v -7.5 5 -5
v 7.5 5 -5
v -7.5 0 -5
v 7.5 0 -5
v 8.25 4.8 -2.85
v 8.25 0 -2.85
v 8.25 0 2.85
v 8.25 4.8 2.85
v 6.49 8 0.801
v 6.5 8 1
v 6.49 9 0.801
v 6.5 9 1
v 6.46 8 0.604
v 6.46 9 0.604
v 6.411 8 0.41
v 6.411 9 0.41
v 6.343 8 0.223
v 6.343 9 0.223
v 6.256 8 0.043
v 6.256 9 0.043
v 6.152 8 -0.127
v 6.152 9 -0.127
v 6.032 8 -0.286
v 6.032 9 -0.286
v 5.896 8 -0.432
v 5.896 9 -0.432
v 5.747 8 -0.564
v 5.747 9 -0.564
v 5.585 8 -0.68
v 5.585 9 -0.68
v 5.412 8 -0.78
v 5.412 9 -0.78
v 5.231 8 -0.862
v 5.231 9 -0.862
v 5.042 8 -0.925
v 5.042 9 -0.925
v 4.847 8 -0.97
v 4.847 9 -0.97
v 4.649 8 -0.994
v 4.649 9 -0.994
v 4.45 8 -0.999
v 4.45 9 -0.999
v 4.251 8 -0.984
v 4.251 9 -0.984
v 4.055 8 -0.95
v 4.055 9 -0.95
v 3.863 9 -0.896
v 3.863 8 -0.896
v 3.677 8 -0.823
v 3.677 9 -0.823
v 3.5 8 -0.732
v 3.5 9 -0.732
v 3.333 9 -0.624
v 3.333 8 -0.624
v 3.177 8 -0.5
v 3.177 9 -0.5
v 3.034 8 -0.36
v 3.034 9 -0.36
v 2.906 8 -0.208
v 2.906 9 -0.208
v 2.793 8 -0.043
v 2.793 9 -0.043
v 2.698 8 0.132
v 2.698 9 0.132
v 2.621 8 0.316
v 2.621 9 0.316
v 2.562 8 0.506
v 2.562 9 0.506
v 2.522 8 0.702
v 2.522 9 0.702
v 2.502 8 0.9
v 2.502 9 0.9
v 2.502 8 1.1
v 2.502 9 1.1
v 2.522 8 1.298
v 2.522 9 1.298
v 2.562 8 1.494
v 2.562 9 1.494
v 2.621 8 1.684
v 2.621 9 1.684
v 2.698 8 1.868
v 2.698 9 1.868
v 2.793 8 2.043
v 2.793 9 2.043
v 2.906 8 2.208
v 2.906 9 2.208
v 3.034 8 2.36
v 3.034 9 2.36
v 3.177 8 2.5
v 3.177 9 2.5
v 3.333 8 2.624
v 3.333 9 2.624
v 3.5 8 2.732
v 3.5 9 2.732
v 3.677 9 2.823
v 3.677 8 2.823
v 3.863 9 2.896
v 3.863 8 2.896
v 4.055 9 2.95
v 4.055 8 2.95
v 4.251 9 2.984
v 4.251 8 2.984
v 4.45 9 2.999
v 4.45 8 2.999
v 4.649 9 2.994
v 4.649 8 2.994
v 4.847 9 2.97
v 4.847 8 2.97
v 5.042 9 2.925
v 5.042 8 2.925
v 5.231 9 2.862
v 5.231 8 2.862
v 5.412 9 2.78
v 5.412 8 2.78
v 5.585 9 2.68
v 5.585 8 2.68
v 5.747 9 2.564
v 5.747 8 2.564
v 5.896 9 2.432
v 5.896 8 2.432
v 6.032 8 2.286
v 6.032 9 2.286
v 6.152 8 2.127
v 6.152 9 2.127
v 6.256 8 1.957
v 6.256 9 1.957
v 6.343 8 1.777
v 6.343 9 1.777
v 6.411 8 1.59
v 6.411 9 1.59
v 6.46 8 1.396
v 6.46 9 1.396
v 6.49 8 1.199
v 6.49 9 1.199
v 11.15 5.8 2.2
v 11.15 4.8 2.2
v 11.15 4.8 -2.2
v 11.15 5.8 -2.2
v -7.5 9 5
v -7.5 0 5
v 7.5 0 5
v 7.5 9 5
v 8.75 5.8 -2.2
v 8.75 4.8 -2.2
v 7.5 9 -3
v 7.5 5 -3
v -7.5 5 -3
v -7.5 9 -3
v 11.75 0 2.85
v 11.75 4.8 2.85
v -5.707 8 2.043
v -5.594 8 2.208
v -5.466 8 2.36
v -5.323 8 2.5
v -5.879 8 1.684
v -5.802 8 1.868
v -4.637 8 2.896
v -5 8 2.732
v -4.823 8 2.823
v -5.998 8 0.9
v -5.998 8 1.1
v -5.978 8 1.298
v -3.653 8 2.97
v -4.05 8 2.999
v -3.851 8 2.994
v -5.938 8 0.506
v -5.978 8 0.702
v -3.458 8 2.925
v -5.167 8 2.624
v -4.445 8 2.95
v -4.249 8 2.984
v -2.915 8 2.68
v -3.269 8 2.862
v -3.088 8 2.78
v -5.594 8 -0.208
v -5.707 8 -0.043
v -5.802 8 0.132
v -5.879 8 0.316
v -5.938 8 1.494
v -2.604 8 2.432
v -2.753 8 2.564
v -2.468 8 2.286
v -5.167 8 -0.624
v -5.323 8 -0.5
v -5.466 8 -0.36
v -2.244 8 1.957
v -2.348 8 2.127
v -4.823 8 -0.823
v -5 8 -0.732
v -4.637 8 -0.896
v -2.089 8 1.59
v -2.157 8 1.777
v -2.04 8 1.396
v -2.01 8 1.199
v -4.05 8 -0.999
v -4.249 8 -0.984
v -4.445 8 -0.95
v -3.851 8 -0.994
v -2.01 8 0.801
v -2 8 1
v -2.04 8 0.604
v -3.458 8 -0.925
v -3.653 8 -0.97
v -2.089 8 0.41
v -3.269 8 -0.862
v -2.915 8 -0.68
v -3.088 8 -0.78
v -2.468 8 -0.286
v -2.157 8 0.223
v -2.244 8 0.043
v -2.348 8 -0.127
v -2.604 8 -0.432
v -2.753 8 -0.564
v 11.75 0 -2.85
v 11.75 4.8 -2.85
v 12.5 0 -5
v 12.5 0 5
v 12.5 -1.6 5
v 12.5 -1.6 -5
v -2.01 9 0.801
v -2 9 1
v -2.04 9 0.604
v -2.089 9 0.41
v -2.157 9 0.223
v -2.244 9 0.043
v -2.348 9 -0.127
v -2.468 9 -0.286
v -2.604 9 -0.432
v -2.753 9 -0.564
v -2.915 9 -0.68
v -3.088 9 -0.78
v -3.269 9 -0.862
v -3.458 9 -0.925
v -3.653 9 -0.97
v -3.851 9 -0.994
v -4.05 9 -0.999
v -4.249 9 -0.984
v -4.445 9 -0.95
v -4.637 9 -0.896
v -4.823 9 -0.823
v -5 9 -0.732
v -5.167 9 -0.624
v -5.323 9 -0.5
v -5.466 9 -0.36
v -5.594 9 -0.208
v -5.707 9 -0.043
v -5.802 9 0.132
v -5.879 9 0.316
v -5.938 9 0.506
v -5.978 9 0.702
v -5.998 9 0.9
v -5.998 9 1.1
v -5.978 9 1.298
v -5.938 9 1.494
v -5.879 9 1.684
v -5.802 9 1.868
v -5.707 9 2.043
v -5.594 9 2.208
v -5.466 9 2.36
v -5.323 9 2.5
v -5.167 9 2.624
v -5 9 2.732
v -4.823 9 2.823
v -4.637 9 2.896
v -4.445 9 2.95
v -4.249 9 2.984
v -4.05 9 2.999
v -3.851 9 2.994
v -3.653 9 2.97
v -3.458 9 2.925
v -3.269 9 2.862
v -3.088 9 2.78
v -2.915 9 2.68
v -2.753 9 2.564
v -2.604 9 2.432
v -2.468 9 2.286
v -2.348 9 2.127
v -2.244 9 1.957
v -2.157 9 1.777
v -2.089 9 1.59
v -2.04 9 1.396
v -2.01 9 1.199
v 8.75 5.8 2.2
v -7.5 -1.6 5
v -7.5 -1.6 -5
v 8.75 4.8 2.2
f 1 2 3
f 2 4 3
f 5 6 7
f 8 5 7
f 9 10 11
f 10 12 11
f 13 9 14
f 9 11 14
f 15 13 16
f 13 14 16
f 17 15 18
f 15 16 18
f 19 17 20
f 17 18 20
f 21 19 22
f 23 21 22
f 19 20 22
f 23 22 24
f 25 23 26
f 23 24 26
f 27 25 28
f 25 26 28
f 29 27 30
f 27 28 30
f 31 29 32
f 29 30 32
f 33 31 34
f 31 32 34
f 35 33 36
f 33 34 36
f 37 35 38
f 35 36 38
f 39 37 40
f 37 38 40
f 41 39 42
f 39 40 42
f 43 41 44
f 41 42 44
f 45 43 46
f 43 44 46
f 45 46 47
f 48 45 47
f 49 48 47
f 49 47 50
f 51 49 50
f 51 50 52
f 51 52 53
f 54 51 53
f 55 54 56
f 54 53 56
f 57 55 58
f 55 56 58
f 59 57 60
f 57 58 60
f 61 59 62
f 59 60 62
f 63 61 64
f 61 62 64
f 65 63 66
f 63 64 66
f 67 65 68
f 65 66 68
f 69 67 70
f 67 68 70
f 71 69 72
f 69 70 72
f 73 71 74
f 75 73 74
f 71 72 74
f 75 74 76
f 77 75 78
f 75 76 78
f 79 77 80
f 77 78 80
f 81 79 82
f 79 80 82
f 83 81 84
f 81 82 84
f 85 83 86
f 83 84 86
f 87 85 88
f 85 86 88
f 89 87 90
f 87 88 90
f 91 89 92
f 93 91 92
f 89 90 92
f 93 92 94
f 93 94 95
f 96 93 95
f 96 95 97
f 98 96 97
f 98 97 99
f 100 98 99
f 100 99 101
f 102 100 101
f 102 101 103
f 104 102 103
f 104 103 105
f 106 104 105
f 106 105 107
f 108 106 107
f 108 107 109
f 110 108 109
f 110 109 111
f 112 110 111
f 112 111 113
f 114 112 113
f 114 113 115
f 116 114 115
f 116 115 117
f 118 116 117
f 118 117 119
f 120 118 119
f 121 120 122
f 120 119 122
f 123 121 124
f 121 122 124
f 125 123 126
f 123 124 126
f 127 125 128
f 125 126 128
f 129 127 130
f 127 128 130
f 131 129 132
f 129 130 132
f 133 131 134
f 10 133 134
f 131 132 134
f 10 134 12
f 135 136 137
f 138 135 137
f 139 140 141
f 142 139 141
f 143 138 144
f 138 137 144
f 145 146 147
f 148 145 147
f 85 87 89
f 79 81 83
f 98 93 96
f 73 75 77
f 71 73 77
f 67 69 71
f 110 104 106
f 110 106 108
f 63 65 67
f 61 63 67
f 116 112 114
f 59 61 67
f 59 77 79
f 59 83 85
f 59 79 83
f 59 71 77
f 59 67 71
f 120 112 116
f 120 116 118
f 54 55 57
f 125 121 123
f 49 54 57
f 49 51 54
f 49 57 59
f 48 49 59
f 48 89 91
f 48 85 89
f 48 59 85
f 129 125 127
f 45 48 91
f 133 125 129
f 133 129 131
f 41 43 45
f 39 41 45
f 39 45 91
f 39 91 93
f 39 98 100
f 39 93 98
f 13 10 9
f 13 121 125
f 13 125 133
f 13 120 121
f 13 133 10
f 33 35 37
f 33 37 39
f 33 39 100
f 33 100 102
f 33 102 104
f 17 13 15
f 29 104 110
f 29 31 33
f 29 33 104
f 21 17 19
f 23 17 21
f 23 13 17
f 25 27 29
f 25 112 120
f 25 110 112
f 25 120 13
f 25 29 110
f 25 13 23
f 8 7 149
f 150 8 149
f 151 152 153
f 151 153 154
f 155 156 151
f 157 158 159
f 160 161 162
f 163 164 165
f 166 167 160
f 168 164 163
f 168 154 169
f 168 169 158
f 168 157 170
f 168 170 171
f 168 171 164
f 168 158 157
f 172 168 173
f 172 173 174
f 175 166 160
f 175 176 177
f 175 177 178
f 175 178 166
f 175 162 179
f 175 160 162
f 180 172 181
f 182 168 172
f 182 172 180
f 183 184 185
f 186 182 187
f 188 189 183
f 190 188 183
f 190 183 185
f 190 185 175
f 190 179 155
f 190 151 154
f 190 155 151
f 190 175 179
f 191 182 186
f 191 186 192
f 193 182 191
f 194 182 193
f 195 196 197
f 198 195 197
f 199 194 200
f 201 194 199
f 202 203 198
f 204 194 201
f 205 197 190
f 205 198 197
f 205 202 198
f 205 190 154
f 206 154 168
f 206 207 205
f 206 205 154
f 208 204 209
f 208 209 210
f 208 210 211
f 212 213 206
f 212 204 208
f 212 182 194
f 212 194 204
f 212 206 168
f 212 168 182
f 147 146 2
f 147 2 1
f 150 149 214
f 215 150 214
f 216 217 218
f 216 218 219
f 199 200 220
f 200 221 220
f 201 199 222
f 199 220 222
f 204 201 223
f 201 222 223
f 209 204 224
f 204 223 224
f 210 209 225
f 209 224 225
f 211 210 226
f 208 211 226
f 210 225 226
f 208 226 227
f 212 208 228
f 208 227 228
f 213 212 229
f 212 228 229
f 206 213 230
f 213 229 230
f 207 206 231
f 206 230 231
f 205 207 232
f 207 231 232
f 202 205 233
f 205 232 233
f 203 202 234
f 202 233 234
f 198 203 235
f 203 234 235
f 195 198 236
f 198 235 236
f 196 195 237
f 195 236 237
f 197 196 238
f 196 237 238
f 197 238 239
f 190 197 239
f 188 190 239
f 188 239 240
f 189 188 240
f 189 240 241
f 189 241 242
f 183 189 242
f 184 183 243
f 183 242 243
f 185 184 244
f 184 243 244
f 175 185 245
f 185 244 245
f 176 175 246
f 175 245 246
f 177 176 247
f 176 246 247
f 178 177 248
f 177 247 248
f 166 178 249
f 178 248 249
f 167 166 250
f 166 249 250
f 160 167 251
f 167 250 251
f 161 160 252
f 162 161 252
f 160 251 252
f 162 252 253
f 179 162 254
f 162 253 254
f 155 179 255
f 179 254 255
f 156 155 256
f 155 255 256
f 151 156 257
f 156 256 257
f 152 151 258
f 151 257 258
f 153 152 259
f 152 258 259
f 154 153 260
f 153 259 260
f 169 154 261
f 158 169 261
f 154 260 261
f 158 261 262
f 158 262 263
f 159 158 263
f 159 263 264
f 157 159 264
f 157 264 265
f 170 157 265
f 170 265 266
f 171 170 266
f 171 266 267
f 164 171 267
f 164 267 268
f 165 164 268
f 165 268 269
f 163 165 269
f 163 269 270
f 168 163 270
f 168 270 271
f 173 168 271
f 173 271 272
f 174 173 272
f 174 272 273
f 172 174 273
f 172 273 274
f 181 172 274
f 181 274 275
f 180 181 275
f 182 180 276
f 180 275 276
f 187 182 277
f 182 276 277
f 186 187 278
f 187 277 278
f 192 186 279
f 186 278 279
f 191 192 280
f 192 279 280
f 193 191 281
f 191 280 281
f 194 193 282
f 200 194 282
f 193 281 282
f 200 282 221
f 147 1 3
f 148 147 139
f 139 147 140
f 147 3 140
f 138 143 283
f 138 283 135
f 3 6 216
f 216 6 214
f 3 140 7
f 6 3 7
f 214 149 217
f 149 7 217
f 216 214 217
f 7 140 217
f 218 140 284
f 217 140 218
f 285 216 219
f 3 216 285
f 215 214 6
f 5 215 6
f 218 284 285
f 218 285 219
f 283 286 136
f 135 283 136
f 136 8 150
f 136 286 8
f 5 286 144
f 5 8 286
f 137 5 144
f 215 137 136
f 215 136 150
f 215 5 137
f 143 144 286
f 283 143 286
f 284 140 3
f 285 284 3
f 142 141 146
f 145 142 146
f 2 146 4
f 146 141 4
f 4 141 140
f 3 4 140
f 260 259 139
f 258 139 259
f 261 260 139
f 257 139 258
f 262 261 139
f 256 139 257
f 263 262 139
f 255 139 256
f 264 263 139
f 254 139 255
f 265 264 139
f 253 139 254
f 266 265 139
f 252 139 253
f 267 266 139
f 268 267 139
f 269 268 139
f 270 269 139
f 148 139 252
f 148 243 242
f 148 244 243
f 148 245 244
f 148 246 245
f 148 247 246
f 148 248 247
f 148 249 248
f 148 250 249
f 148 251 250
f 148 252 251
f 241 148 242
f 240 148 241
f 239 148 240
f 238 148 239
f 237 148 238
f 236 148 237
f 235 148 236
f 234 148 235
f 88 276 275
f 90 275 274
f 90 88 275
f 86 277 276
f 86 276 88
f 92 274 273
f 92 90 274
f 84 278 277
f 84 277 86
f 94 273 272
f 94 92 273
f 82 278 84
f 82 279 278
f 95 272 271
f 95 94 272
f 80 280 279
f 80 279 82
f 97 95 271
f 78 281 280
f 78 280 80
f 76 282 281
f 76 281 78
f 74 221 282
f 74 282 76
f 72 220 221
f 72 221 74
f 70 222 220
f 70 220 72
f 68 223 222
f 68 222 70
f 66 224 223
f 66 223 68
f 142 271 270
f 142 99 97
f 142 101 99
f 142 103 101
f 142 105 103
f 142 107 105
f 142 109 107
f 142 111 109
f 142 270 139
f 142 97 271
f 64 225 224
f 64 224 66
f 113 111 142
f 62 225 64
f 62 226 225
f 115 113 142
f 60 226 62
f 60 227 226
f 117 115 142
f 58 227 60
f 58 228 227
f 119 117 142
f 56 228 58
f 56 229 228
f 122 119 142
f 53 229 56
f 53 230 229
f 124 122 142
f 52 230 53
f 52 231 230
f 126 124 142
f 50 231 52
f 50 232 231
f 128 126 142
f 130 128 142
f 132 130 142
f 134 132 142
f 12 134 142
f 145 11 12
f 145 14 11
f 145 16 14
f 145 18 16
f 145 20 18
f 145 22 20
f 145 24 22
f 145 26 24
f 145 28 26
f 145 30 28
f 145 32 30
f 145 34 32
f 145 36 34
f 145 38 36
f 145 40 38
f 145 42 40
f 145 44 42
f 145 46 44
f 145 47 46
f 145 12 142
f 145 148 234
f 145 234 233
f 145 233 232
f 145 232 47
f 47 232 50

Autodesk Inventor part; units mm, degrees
sketch "Szkic1" plane through (0, 0, 0) normal (0, 1, 0) x (-1, 0, 0)
  line L0 (7.5, 5) -> (-7.5, 5)
  line L1 (-7.5, 5) -> (-7.5, -5)
  line L2 (-7.5, -5) -> (7.5, -5)
  line L3 (7.5, -5) -> (7.5, 5)
  point P0 (0, 0)
  dimension "d0" = 10
  dimension "d1" = 15
  dimension "d2" = 5
  dimension "d3" = 7.5
extrude "Wyciągnięcie proste1" add sketch "Szkic1" along normal blind 5
sketch "Szkic2" plane through (0, 5, 0) normal (0, 1, 0) x (1, 0, 0)
  line L0 (-7.5, -5) -> (7.5, -5) projected
  line L1 (7.5, -5) -> (7.5, 5) projected
  line L2 (-7.5, -5) -> (7.5, -5)
  line L3 (7.5, -5) -> (7.5, 3)
  line L4 (7.5, 3) -> (-7.5, 3)
  line L5 (-7.5, 3) -> (-7.5, -5)
  point P0 (0, 0)
  dimension "d6" = 8
extrude "Wyciągnięcie proste2" add sketch "Szkic2" along normal blind 4
sketch "Szkic3" plane through (0, 9, 0) normal (0, 1, 0) x (1, 0, 0)
  circle A0 centre (-4, -1) radius 2
  line L0 (-7.5, 3) -> (-7.5, -5) projected
  line L1 (7.5, 3) -> (-7.5, 3) projected
  circle A1 centre (4.5, -1) radius 2
  line L2 (7.5, -5) -> (7.5, 3) projected
  point P0 (0, 0)
  dimension "d9" = 4
  dimension "d10" = 3.5
  dimension "d11" = 4
  dimension "d12" = 3
  dimension "d13" = 4
  dimension "d14" = 4
extrude "Wyciągnięcie proste3" cut sketch "Szkic3" against normal blind 1
sketch "Sketch4" plane through (0, 0, 0) normal (0, -1, 0) x (1, 0, 0)
  line L0 (-7.5, 5) -> (7.5, 5) projected
  line L1 (7.5, -5) -> (-7.5, -5) projected
  line L2 (7.5, 5) -> (-7.5, 5)
  line L3 (-7.5, 5) -> (-7.5, -5)
  line L4 (-7.5, -5) -> (7.5, -5)
  line L5 (7.5, 5) -> (12.5, 5)
  line L6 (12.5, 5) -> (12.5, -5)
  line L7 (12.5, -5) -> (7.5, -5)
  line L8 (7.5, -5) -> (-7.5, -5) projected
  line L9 (-7.5, -5) -> (-7.5, 5) projected
  point P0 (0, 0)
  dimension "d19" = 20
extrude "Extrusion4" add sketch "Sketch4" along normal blind 1.6 separate body
sketch "Sketch5" plane through (0, 0, 0) normal (0, 1, 0) x (1, 0, 0)
  line L0 (11.75, 2.85) -> (8.25, 2.85)
  line L1 (8.25, 2.85) -> (8.25, -2.85)
  line L2 (8.25, -2.85) -> (11.75, -2.85)
  line L3 (11.75, -2.85) -> (11.75, 2.85)
  line L4 (-7.5, 5) -> (12.5, 5) projected
  line L5 (7.5, -5) -> (7.5, 3) projected
  point P0 (0, 0)
  dimension "d20" = 3.5
  dimension "d21" = 5.7
  dimension "d22" = 2.15
  dimension "d23" = 0.75
extrude "Extrusion5" add sketch "Sketch5" along normal blind 4.8 bodies 2
sketch "Sketch7" plane through (0, 4.8, 0) normal (0, 1, 0) x (1, 0, 0)
  line L0 (11.15, 2.2) -> (8.75, 2.2)
  line L1 (8.75, 2.2) -> (8.75, -2.2)
  line L2 (8.75, -2.2) -> (11.15, -2.2)
  line L3 (11.15, -2.2) -> (11.15, 2.2)
  line L4 (8.25, -2.85) -> (11.75, -2.85) projected
  line L5 (8.25, 2.85) -> (8.25, -2.85) projected
  point P0 (0, 0)
  dimension "d32" = 4.4
  dimension "d33" = 0.65
  dimension "d34" = 2.4
  dimension "d35" = 0.5
extrude "Extrusion7" add sketch "Sketch7" along normal blind 1 bodies 2
ref_plane "Work Plane1" through (-7.5, 0, 3) normal (0, 0, 1) x (1, 0, 0)
ref_plane "Work Plane2" through (8.75, 4.8, 1.2) normal (0, 0, 1) x (1, 0, 0)
ref_plane "Work Plane3" through (11.15, 4.8, -1.2) normal (0, 0, -1) x (-1, 0, 0)
ref_plane "Work Plane4" through (-7.5, 0, 0) normal (0, 0, 1) x (1, 0, 0)
sketch "Sketch9" plane through (8.75, 4.8, 1.2) normal (0, 0, 1) x (1, 0, 0)
  line L0 (1.4, 1) -> (3.3549, 7.2)
  line L1 (3.3549, 7.2) -> (-0.9549, 7.2)
  line L2 (-0.9549, 7.2) -> (1, 1)
  line L3 (1, 1) -> (1.4, 1)
  line L4 (0, 1) -> (2.4, 1) projected
  line L5 (2.4, 0) -> (2.4, 1) projected
  line L6 (2.4, 1) -> (0, 1) construction
  line L7 (1.2, 1) -> (1.2, 8.0865) construction
  line L8 (-16.25, 4.2) -> (-1.25, 4.2) construction
  line L9 (1.2, 1) -> (1.2, 7.2)
  point P0 (-8.75, -4.8)
  dimension "d47" = 0.4
  dimension "d48" = 0
  dimension "d49" = 1
  dimension "d50" = 17.5
  dimension "d51" = 35
  dimension "d53" = 3
properties part number "Sharp_Czujnik"
